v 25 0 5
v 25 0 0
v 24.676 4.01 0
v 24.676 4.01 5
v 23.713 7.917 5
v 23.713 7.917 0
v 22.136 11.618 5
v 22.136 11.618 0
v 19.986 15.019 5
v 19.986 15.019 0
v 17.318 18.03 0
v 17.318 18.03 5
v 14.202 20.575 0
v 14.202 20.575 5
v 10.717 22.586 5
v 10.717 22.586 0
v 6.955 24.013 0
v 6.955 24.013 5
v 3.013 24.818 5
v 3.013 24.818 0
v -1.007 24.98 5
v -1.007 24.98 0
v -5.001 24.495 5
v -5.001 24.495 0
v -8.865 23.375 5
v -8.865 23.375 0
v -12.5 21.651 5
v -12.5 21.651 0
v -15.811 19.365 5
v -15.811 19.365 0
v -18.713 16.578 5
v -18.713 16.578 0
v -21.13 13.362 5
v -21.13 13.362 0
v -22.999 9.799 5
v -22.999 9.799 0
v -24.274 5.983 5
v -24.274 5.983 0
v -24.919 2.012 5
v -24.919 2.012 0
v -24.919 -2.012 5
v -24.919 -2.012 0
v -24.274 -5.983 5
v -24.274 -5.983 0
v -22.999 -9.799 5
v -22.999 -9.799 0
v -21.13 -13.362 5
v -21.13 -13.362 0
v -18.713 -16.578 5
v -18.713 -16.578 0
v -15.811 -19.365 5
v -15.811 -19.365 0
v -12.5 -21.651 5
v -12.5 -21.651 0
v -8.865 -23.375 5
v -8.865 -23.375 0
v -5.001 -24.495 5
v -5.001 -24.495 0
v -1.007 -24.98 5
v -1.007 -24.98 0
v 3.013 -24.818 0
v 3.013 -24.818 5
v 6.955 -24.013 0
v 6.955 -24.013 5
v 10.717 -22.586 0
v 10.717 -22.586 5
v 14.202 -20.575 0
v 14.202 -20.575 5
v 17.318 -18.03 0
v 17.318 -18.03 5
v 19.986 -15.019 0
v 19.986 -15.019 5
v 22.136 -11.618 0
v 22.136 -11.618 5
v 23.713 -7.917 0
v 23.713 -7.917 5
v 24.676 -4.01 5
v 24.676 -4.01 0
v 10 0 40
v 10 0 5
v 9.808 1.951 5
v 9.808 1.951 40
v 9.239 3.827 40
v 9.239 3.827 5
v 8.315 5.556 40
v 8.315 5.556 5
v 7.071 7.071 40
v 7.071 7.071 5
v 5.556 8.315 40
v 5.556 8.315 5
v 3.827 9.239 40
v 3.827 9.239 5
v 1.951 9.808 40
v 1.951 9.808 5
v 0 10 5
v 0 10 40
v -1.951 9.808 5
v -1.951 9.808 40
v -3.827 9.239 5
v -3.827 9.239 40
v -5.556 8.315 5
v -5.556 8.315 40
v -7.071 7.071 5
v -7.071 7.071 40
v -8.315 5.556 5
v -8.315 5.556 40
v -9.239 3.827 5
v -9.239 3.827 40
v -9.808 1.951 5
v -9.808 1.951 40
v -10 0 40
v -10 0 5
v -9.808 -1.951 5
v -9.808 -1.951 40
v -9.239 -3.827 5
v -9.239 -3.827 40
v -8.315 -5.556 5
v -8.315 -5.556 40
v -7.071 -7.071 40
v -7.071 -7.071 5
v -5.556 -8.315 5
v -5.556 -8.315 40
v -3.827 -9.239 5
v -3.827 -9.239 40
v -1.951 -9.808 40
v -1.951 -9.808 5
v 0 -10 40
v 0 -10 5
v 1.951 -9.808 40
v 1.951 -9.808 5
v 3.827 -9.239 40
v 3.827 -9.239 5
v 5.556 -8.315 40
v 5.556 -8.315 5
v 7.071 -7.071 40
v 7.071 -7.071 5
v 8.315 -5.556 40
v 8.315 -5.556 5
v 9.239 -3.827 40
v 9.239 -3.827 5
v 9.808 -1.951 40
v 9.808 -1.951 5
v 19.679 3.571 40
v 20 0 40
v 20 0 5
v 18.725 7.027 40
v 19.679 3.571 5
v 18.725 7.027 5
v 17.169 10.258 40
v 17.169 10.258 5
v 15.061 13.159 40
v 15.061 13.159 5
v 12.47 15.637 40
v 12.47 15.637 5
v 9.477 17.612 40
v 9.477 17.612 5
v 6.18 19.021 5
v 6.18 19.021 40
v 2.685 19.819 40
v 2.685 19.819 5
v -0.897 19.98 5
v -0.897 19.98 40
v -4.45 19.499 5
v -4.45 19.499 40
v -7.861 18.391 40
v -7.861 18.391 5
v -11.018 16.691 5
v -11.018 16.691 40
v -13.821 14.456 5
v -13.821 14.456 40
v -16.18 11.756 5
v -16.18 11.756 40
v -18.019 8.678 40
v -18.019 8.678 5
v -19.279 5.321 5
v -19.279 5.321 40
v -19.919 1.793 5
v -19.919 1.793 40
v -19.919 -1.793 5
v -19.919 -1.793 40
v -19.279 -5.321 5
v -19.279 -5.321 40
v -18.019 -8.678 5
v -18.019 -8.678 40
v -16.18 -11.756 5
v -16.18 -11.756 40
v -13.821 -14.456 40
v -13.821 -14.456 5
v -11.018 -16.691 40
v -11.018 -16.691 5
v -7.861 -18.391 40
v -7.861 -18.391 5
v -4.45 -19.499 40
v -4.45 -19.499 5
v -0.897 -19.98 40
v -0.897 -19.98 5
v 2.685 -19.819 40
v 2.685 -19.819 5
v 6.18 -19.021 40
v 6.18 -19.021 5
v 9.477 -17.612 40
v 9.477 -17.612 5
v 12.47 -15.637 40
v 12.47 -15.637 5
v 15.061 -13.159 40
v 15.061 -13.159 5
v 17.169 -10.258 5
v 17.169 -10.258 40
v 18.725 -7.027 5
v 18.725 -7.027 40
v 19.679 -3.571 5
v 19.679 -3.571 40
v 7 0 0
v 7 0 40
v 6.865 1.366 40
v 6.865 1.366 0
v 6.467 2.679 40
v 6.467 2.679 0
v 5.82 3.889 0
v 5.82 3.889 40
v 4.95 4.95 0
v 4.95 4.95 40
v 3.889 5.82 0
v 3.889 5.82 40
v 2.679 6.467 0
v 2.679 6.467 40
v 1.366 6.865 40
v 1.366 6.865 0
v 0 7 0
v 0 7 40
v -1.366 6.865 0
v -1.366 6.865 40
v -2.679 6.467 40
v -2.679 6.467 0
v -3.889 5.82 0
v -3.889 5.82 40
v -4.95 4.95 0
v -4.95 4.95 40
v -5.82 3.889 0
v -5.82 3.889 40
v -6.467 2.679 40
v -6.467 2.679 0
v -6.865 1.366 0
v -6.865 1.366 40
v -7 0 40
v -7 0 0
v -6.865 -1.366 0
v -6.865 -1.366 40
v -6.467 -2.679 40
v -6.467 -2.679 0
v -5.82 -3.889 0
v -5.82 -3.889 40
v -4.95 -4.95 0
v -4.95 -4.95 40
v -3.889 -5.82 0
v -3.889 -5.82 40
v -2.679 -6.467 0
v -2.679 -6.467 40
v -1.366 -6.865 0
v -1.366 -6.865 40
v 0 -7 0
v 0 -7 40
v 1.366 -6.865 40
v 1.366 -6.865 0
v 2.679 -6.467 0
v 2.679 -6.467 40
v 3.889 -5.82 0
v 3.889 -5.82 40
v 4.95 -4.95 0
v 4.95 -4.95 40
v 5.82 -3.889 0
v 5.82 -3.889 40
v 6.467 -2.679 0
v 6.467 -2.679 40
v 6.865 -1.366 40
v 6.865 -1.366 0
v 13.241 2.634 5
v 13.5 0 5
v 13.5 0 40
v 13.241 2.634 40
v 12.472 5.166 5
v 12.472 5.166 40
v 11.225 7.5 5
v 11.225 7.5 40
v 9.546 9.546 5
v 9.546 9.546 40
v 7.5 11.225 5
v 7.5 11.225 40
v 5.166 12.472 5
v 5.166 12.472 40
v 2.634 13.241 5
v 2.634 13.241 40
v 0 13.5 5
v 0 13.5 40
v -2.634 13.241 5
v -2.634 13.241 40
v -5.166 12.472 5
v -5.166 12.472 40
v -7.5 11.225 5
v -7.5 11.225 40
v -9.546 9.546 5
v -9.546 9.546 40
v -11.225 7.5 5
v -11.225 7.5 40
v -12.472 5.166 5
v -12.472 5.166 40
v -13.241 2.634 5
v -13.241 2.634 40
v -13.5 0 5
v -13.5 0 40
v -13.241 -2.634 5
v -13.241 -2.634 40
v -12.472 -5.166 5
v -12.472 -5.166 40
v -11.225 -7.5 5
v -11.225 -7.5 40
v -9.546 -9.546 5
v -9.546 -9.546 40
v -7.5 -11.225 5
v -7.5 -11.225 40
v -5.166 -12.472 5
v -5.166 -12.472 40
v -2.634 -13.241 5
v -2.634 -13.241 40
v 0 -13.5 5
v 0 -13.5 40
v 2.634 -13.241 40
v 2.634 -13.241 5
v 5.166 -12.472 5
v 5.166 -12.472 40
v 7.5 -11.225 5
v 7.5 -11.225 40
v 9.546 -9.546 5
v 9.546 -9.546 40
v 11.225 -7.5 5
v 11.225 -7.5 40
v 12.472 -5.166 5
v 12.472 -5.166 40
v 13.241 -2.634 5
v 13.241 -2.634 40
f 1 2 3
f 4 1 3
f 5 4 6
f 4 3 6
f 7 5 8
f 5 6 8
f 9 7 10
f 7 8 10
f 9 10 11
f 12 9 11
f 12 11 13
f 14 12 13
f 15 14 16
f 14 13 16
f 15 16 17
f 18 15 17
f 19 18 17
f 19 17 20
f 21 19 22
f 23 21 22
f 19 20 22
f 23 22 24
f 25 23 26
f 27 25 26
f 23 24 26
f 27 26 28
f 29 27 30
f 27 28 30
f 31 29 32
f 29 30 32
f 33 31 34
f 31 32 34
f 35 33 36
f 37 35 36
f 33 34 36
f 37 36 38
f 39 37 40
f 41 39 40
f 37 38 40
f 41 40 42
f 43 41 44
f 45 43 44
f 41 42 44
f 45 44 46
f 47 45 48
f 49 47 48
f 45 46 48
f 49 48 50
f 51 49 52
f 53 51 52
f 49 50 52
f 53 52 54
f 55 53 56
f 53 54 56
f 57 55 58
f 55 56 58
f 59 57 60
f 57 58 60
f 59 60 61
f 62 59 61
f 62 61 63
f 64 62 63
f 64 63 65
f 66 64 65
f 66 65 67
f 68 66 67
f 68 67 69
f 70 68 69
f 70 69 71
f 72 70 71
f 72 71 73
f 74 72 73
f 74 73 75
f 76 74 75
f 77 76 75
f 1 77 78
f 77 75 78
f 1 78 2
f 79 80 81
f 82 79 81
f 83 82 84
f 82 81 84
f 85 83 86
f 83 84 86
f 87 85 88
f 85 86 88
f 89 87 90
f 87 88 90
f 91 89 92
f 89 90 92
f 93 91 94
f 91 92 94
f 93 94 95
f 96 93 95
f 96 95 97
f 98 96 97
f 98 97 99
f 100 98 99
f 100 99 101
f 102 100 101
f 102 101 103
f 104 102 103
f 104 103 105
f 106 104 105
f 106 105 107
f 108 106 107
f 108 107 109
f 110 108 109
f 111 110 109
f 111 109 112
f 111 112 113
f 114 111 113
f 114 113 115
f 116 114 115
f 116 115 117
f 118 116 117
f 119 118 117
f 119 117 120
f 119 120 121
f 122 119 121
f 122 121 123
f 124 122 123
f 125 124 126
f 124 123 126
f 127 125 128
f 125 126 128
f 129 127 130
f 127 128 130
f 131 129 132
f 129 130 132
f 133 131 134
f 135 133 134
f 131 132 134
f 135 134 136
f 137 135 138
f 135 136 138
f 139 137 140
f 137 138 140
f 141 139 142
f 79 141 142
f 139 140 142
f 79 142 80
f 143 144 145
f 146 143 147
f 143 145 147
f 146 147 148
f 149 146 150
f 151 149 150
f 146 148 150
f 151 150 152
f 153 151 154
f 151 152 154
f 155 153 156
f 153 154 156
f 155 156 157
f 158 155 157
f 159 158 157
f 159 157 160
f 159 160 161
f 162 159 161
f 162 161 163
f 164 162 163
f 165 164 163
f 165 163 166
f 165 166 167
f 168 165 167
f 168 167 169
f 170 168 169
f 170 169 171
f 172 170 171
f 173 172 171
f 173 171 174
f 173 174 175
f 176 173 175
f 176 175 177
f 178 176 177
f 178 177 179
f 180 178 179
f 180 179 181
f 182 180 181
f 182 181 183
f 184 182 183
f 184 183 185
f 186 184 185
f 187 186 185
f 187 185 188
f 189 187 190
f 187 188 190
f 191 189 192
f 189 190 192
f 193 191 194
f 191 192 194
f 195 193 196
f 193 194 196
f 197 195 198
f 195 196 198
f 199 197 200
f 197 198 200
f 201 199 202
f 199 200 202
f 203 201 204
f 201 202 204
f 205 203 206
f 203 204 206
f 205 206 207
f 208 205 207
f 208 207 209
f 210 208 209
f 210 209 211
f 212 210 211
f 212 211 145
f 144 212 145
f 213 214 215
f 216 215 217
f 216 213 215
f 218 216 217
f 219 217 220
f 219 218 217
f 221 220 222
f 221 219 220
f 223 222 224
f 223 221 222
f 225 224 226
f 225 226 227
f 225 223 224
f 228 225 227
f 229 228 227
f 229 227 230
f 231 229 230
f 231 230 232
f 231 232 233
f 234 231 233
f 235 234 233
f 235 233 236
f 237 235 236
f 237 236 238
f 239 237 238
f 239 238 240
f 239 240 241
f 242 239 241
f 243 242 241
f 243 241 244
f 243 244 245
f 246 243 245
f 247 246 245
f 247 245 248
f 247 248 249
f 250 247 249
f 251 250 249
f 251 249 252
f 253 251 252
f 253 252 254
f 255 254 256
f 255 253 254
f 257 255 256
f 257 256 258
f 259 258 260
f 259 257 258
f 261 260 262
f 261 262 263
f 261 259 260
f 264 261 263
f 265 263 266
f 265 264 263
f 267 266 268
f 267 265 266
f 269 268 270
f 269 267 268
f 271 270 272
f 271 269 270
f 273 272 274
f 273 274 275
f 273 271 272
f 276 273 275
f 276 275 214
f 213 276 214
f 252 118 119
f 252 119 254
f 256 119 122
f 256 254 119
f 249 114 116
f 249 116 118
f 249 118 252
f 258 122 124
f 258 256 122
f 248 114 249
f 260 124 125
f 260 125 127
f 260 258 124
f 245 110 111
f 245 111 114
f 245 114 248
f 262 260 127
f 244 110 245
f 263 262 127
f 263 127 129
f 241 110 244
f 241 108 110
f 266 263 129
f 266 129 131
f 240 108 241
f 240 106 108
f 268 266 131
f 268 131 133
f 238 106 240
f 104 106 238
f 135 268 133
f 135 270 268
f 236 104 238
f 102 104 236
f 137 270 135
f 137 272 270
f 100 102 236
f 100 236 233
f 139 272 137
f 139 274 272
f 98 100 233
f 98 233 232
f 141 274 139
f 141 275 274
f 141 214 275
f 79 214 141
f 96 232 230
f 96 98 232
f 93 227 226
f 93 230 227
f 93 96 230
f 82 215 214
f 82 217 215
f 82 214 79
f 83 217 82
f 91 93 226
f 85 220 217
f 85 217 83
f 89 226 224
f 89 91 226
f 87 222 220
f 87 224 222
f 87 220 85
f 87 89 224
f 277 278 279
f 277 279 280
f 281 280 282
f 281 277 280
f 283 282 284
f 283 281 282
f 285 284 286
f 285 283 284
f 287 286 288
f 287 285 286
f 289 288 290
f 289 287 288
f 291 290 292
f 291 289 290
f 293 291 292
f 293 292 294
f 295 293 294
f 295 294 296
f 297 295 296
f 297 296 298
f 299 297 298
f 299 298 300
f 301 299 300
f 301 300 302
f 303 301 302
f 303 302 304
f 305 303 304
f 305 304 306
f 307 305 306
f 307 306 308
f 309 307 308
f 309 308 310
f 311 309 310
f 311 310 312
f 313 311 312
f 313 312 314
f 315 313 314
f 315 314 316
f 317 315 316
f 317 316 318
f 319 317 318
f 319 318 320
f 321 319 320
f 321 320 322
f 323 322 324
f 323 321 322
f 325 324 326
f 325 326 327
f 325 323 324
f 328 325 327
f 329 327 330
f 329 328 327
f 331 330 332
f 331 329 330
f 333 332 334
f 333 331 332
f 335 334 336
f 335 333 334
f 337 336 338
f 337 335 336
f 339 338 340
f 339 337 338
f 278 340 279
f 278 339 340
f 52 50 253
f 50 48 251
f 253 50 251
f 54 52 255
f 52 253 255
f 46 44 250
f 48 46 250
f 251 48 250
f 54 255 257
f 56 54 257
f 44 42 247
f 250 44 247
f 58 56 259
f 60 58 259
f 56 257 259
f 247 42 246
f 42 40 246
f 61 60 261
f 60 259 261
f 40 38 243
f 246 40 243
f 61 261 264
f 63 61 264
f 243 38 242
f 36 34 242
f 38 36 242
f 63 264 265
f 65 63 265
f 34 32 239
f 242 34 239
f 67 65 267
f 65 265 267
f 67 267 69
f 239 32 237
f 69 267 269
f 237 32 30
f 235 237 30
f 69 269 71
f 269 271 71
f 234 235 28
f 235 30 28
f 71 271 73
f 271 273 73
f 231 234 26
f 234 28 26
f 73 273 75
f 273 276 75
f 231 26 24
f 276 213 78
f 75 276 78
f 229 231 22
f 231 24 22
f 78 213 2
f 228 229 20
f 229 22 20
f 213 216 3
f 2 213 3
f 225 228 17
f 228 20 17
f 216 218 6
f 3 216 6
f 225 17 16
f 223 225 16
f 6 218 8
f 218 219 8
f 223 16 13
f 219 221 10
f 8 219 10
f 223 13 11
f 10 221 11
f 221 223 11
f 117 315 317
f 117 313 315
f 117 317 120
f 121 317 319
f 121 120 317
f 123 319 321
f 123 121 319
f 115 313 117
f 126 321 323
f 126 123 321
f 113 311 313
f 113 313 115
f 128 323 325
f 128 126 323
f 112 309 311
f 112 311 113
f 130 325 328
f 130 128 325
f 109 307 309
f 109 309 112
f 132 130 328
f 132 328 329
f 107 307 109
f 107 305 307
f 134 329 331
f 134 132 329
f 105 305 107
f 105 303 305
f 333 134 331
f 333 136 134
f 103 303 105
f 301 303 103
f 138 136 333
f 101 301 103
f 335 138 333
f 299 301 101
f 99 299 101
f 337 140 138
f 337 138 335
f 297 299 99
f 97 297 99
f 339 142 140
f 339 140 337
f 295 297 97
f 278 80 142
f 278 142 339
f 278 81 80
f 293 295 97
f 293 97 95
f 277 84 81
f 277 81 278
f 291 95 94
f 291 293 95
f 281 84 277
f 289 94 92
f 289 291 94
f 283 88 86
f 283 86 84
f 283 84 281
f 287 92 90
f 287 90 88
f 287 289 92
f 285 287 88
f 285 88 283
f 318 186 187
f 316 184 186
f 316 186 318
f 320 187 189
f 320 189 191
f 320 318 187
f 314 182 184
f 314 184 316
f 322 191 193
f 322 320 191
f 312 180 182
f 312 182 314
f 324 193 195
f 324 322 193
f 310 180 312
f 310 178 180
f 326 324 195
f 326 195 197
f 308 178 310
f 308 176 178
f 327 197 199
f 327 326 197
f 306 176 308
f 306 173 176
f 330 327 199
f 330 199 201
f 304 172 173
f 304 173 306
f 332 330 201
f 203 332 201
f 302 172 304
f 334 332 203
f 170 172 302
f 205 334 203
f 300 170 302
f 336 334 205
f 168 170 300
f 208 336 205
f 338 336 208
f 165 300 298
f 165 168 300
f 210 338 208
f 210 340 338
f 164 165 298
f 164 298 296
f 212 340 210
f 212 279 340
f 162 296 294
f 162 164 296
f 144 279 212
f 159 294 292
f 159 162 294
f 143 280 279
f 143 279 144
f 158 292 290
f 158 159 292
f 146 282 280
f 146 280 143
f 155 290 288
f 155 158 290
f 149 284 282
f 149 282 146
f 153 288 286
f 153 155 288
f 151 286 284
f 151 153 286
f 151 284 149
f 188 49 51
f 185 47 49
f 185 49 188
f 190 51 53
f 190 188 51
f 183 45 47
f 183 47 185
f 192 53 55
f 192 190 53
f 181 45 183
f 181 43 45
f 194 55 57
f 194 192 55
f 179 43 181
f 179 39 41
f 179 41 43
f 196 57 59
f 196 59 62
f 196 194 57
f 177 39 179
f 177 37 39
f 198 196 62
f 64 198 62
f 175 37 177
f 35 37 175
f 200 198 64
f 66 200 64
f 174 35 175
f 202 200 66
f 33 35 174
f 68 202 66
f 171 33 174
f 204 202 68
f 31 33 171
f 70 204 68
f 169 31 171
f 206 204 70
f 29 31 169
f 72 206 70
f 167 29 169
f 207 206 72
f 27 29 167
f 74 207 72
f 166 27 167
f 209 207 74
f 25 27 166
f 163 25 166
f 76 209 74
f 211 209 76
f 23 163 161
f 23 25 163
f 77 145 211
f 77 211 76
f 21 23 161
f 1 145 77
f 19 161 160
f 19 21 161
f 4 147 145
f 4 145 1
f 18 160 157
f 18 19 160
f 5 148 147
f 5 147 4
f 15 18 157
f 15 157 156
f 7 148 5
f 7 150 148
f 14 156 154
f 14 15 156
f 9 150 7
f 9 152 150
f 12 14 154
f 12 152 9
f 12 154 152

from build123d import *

# Parameters (mm, degrees)
F0_R     = 25
F0_R_2   = 20
F0_R_3   = 13.5
F0_R_4   = 10
F0_R_5   = 7
F1_DEPTH = 5
F2_DEPTH = 40
F3_DEPTH = 40


with BuildPart() as f1:
    # F0 (on Top) → F1 (new body)
    with BuildSketch(Plane.XY):
        Circle(F0_R)
        Circle(F0_R_2, mode=Mode.SUBTRACT)
        Circle(F0_R_2)
        Circle(F0_R_3, mode=Mode.SUBTRACT)
        Circle(F0_R_3)
        Circle(F0_R_4, mode=Mode.SUBTRACT)
        Circle(F0_R_4)
        Circle(F0_R_5, mode=Mode.SUBTRACT)
    extrude(amount=F1_DEPTH)

    # F0 (on Top) → F2 (join)
    with BuildSketch(Plane.XY):
        Circle(F0_R_2)
        Circle(F0_R_3, mode=Mode.SUBTRACT)
    extrude(amount=F2_DEPTH)

    # F0 (on Top) → F3 (join)
    with BuildSketch(Plane.XY):
        Circle(F0_R_4)
        Circle(F0_R_5, mode=Mode.SUBTRACT)
    extrude(amount=F3_DEPTH)


solid = f1.part
